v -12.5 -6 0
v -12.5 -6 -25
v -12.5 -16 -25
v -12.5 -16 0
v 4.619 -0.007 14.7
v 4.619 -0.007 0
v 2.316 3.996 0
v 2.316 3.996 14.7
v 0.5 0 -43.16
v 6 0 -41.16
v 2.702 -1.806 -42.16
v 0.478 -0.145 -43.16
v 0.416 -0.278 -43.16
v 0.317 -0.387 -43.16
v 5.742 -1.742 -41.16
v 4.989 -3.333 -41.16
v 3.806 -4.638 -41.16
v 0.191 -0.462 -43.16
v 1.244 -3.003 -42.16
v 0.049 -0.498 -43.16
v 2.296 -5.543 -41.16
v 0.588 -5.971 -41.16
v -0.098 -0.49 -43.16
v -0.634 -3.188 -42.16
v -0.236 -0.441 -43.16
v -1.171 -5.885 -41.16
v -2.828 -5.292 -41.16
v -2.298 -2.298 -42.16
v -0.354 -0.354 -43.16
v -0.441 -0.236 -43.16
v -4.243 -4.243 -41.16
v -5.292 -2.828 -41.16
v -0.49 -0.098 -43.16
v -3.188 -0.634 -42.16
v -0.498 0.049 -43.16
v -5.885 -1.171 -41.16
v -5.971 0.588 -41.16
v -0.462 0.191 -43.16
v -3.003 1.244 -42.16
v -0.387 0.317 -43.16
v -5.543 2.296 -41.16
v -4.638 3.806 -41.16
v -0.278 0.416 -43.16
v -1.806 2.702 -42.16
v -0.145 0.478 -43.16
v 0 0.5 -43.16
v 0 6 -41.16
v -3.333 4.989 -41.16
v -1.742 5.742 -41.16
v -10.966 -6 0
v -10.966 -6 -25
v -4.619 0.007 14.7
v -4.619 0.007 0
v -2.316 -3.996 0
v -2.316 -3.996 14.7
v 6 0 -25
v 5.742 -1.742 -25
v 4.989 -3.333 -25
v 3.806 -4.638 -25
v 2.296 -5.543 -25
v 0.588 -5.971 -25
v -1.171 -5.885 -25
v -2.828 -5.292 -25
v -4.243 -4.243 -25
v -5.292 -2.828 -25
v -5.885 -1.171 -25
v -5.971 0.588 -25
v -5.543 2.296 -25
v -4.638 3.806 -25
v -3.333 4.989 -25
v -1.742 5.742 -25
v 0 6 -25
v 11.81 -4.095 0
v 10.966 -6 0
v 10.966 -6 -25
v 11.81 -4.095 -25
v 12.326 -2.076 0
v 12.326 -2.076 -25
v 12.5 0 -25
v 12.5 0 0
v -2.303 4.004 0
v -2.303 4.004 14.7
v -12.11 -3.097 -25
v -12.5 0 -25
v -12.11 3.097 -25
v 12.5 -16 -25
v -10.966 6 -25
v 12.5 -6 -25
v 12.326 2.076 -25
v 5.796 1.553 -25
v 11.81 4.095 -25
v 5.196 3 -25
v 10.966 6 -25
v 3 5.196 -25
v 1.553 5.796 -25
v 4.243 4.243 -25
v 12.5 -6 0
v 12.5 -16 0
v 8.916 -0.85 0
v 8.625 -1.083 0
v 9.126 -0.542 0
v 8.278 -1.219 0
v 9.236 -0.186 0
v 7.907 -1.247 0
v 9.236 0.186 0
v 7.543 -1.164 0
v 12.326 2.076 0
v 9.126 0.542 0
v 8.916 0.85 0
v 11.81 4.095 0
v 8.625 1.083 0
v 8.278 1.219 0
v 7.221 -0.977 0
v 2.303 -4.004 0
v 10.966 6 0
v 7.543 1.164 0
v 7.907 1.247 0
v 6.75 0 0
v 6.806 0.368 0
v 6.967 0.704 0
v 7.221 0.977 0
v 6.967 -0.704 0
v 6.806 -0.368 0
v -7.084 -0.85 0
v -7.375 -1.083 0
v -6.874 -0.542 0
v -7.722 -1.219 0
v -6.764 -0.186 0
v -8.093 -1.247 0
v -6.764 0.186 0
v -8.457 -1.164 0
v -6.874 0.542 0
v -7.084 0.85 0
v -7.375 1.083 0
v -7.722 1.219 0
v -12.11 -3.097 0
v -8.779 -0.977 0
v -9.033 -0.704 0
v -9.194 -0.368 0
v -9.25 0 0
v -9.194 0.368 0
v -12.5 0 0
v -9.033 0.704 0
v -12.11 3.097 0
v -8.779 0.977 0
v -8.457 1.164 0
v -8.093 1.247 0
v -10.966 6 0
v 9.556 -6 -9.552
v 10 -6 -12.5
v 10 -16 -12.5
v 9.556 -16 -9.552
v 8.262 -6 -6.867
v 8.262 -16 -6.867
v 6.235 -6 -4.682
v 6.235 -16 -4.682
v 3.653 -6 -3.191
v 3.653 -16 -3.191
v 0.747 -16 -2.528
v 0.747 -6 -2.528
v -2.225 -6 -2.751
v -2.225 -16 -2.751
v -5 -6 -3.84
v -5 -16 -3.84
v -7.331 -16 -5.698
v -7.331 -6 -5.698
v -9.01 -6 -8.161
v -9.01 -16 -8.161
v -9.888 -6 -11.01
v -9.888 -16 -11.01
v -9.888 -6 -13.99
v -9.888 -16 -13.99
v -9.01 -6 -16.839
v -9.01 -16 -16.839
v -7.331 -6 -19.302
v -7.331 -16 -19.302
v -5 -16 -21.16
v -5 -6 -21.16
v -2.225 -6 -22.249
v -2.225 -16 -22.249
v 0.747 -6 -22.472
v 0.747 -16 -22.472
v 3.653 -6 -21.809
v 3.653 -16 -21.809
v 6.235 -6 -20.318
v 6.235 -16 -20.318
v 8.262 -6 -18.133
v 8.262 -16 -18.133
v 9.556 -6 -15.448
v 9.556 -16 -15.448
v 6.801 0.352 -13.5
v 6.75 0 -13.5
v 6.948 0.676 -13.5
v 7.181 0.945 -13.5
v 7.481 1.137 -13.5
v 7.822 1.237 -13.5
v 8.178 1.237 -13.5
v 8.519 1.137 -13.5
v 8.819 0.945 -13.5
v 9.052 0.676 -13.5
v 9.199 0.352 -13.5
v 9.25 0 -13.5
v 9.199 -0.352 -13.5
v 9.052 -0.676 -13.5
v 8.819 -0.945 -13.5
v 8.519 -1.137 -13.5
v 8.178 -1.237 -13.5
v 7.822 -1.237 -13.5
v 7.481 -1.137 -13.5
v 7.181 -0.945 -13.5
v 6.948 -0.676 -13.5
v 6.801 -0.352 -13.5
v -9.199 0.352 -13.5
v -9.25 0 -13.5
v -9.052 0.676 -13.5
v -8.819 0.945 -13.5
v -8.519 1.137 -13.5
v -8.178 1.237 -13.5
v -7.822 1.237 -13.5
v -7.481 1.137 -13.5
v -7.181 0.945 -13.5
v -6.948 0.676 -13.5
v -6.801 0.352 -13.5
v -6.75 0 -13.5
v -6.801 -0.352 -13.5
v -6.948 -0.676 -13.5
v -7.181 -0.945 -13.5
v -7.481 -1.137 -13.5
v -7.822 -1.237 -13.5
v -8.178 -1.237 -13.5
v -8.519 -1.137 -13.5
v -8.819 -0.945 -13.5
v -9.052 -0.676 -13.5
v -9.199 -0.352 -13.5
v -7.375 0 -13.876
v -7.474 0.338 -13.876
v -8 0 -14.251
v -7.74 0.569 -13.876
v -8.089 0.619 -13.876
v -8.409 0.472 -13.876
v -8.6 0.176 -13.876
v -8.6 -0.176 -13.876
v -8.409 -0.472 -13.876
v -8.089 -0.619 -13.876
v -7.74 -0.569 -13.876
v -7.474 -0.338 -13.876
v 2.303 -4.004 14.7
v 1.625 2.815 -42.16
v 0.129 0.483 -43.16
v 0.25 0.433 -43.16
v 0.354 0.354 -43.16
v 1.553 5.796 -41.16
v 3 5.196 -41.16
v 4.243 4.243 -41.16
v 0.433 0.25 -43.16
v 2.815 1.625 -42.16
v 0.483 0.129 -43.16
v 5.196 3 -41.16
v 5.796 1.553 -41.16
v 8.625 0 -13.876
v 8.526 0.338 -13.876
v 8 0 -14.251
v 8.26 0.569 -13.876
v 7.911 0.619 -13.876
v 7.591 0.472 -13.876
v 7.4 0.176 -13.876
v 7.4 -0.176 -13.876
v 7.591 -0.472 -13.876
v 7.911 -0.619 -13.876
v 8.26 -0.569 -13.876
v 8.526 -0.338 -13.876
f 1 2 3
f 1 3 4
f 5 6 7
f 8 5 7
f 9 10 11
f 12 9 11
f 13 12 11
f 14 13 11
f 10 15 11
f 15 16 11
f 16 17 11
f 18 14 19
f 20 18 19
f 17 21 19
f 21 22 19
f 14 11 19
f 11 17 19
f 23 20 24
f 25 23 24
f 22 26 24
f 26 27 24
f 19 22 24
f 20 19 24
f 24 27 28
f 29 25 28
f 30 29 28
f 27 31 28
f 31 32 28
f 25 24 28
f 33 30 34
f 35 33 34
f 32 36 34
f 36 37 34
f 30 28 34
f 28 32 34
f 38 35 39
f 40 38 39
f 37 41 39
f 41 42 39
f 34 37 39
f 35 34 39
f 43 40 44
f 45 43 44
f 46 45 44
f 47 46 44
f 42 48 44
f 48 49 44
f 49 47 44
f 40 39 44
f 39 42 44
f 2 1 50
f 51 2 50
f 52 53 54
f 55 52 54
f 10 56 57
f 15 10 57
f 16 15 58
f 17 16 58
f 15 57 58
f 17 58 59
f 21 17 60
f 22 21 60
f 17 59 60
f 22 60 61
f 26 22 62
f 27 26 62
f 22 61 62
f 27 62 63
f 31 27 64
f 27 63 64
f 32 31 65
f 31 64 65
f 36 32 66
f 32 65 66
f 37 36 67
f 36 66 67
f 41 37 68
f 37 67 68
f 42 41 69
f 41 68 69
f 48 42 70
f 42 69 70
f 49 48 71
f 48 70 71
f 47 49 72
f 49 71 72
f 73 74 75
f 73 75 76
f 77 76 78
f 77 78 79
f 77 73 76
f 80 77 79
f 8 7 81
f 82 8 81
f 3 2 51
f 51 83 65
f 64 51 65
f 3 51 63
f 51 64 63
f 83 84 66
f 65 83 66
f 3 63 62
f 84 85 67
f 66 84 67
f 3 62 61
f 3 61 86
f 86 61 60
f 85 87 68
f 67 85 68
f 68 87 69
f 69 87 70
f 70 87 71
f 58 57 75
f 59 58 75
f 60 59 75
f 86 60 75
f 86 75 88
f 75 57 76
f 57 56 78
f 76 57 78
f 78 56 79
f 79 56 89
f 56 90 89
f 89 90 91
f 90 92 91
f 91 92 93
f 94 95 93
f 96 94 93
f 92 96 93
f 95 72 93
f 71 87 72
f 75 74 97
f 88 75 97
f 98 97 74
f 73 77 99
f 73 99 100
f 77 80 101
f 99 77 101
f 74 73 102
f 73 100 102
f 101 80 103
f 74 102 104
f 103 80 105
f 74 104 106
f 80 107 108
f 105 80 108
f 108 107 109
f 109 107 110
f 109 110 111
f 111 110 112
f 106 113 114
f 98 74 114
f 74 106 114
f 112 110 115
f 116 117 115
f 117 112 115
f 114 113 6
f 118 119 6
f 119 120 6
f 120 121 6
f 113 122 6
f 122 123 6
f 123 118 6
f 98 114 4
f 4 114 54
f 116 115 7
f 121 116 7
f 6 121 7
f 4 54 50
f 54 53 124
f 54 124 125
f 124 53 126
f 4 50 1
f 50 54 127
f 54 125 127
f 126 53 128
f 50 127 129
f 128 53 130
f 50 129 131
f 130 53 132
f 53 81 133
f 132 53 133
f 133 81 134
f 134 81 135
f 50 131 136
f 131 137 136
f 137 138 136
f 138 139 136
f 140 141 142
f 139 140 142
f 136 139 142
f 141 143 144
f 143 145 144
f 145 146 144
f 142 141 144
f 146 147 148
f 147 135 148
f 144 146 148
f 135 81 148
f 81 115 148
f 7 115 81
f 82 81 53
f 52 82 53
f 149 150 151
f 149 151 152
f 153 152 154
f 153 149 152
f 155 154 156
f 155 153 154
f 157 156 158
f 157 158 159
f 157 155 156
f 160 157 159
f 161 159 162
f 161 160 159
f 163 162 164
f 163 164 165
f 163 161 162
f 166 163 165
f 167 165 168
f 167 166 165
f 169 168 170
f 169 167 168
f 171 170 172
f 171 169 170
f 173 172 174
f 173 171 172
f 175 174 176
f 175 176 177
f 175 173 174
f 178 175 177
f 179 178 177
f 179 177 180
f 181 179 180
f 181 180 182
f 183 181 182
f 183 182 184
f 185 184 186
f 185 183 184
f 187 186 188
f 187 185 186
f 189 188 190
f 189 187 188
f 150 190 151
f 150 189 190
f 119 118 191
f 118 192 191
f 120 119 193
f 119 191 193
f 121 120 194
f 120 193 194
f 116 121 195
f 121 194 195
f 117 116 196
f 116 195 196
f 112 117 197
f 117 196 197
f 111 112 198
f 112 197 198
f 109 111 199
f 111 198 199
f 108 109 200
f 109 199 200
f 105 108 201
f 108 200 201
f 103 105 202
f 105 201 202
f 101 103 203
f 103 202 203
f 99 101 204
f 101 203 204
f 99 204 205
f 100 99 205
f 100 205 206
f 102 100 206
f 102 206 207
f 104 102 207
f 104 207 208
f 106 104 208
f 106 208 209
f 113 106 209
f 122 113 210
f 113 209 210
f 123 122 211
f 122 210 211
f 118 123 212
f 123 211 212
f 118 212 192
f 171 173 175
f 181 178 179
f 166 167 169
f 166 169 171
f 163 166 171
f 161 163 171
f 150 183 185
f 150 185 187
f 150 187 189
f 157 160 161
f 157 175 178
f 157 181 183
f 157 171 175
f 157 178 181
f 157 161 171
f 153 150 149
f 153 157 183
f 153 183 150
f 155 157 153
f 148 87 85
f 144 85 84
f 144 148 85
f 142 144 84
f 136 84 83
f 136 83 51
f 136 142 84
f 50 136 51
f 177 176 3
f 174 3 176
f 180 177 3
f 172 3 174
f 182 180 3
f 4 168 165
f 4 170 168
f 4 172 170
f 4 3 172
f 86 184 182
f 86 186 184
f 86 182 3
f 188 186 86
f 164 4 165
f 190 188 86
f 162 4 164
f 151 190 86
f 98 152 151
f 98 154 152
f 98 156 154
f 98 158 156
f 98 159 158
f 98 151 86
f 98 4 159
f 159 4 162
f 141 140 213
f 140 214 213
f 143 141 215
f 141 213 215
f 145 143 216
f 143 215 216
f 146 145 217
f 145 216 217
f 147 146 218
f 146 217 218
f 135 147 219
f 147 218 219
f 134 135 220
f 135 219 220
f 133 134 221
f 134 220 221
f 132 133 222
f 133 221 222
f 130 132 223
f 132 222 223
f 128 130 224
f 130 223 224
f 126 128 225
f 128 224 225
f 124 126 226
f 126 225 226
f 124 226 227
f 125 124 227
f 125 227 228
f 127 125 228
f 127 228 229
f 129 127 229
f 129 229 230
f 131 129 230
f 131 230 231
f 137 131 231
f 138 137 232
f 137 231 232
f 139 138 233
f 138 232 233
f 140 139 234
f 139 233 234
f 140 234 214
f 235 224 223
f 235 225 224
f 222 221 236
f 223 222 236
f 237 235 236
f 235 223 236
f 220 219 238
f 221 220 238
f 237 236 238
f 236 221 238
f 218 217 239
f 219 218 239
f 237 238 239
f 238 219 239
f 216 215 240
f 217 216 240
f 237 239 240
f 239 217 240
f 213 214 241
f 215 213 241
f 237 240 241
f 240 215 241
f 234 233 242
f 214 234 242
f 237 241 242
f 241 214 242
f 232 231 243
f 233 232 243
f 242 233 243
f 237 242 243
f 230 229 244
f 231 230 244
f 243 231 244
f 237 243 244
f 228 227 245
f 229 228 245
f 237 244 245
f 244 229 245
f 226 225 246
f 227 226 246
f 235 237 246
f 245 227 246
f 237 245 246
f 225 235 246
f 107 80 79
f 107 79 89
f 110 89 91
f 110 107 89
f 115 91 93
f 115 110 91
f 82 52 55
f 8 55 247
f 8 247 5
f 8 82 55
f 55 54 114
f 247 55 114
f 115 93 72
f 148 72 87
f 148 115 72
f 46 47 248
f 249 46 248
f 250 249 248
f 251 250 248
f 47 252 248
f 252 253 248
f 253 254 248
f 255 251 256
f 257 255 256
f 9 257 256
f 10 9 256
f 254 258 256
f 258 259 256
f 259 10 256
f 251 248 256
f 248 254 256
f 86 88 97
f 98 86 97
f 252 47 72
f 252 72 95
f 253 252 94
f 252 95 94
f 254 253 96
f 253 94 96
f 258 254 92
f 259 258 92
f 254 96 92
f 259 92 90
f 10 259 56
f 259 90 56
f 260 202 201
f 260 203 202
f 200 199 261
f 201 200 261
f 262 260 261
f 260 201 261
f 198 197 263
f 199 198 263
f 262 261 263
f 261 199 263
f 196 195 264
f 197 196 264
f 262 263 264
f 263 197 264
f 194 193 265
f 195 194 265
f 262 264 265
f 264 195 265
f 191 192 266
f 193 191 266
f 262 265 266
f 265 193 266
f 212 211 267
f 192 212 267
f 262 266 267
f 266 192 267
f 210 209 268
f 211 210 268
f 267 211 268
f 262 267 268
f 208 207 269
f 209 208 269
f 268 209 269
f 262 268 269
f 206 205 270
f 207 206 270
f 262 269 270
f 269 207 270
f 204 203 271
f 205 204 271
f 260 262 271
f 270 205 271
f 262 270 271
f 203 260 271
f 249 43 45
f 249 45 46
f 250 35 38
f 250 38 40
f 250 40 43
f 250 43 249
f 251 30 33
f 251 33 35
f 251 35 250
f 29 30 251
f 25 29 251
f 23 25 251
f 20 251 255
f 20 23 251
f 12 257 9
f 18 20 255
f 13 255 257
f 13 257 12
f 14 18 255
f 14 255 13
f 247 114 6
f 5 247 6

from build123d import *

# Parameters (mm, degrees)
F1_DEPTH  = 25
F3_D      = 2.5
F3_DEPTH  = 13.5
F3_TIP    = 0.7510757738
F4_W      = 21.9317121995
F4_H      = 25
F4_R      = 10
F4_W_2    = 1.5341439003
F5_DEPTH  = 10
F7_DEPTH  = 18.16
F8_SIZE2  = 2
F8_SIZE   = 5.5
F10_DEPTH = 14.7


with BuildPart() as f1:
    # F0 (on Top) → F1 (new body)
    with BuildSketch(Plane.XY):
        with BuildLine():
            ThreePointArc((10.9658560997, -6), (12.1103922572, -3.0965140685), (12.5, 0))
            ThreePointArc((12.5, 0), (12.1103922572, 3.0965140685), (10.9658560997, 6))
            Line((10.9658560997, 6), (-10.9658560997, 6))
            ThreePointArc((-10.9658560997, 6), (-12.5, 0), (-10.9658560997, -6))
            Line((-10.9658560997, -6), (10.9658560997, -6))
        make_face()
    extrude(amount=-F1_DEPTH)

    # F3
    with Locations(Plane.XY):
        with Locations((-8, 0), (8, 0)):
            Hole(F3_D / 2, depth=F3_DEPTH)
            with Locations((0, 0, -(F3_DEPTH + F3_TIP / 2))):  # 118° drill point
                Cone(0, F3_D / 2, F3_TIP, mode=Mode.SUBTRACT)

    # F4 (on face) → F5 (join)
    with BuildSketch(Plane.XZ.offset(6)):
        with Locations((0, -12.5)):
            Rectangle(F4_W, F4_H)
        with Locations((0, -12.5)):
            Circle(F4_R, mode=Mode.SUBTRACT)
        with Locations((-11.7329280499, -12.5)):
            Rectangle(F4_W_2, F4_H)
        with Locations((11.7329280499, -12.5)):
            Rectangle(F4_W_2, F4_H)
    extrude(amount=F5_DEPTH)

    # F6 (on face) → F7 (join)
    with BuildSketch(Plane(origin=(0, 0, -25), x_dir=(1, 0, 0), z_dir=(0, 0, -1))):
        with BuildLine():
            ThreePointArc((0, -6), (4.2426406871, -4.2426406871), (6, 0))
            ThreePointArc((6, 0), (-4.2426406871, 4.2426406871), (0, -6))
        make_face()
    extrude(amount=F7_DEPTH)

    # F8
    f8_edges = [f1.edges().sort_by_distance(p)[0] for p in [
        (0, -6, -43.16),
    ]]
    f8_side = f1.faces().sort_by_distance((0, 0, -43.16))[0]
    chamfer(f8_edges, length=F8_SIZE, length2=F8_SIZE2, reference=f8_side)

    # F9 (on face) → F10 (join)
    with BuildSketch(Plane.XY):
        Polygon((4.6187967668, -0.0070541219), (2.3155074321, 3.996468274), (-2.3032893346, 4.0035223959), (-4.6187967668, 0.0070541219), (-2.3155074321, -3.996468274), (2.3032893346, -4.0035223959), align=None)
    extrude(amount=F10_DEPTH)


solid = f1.part
